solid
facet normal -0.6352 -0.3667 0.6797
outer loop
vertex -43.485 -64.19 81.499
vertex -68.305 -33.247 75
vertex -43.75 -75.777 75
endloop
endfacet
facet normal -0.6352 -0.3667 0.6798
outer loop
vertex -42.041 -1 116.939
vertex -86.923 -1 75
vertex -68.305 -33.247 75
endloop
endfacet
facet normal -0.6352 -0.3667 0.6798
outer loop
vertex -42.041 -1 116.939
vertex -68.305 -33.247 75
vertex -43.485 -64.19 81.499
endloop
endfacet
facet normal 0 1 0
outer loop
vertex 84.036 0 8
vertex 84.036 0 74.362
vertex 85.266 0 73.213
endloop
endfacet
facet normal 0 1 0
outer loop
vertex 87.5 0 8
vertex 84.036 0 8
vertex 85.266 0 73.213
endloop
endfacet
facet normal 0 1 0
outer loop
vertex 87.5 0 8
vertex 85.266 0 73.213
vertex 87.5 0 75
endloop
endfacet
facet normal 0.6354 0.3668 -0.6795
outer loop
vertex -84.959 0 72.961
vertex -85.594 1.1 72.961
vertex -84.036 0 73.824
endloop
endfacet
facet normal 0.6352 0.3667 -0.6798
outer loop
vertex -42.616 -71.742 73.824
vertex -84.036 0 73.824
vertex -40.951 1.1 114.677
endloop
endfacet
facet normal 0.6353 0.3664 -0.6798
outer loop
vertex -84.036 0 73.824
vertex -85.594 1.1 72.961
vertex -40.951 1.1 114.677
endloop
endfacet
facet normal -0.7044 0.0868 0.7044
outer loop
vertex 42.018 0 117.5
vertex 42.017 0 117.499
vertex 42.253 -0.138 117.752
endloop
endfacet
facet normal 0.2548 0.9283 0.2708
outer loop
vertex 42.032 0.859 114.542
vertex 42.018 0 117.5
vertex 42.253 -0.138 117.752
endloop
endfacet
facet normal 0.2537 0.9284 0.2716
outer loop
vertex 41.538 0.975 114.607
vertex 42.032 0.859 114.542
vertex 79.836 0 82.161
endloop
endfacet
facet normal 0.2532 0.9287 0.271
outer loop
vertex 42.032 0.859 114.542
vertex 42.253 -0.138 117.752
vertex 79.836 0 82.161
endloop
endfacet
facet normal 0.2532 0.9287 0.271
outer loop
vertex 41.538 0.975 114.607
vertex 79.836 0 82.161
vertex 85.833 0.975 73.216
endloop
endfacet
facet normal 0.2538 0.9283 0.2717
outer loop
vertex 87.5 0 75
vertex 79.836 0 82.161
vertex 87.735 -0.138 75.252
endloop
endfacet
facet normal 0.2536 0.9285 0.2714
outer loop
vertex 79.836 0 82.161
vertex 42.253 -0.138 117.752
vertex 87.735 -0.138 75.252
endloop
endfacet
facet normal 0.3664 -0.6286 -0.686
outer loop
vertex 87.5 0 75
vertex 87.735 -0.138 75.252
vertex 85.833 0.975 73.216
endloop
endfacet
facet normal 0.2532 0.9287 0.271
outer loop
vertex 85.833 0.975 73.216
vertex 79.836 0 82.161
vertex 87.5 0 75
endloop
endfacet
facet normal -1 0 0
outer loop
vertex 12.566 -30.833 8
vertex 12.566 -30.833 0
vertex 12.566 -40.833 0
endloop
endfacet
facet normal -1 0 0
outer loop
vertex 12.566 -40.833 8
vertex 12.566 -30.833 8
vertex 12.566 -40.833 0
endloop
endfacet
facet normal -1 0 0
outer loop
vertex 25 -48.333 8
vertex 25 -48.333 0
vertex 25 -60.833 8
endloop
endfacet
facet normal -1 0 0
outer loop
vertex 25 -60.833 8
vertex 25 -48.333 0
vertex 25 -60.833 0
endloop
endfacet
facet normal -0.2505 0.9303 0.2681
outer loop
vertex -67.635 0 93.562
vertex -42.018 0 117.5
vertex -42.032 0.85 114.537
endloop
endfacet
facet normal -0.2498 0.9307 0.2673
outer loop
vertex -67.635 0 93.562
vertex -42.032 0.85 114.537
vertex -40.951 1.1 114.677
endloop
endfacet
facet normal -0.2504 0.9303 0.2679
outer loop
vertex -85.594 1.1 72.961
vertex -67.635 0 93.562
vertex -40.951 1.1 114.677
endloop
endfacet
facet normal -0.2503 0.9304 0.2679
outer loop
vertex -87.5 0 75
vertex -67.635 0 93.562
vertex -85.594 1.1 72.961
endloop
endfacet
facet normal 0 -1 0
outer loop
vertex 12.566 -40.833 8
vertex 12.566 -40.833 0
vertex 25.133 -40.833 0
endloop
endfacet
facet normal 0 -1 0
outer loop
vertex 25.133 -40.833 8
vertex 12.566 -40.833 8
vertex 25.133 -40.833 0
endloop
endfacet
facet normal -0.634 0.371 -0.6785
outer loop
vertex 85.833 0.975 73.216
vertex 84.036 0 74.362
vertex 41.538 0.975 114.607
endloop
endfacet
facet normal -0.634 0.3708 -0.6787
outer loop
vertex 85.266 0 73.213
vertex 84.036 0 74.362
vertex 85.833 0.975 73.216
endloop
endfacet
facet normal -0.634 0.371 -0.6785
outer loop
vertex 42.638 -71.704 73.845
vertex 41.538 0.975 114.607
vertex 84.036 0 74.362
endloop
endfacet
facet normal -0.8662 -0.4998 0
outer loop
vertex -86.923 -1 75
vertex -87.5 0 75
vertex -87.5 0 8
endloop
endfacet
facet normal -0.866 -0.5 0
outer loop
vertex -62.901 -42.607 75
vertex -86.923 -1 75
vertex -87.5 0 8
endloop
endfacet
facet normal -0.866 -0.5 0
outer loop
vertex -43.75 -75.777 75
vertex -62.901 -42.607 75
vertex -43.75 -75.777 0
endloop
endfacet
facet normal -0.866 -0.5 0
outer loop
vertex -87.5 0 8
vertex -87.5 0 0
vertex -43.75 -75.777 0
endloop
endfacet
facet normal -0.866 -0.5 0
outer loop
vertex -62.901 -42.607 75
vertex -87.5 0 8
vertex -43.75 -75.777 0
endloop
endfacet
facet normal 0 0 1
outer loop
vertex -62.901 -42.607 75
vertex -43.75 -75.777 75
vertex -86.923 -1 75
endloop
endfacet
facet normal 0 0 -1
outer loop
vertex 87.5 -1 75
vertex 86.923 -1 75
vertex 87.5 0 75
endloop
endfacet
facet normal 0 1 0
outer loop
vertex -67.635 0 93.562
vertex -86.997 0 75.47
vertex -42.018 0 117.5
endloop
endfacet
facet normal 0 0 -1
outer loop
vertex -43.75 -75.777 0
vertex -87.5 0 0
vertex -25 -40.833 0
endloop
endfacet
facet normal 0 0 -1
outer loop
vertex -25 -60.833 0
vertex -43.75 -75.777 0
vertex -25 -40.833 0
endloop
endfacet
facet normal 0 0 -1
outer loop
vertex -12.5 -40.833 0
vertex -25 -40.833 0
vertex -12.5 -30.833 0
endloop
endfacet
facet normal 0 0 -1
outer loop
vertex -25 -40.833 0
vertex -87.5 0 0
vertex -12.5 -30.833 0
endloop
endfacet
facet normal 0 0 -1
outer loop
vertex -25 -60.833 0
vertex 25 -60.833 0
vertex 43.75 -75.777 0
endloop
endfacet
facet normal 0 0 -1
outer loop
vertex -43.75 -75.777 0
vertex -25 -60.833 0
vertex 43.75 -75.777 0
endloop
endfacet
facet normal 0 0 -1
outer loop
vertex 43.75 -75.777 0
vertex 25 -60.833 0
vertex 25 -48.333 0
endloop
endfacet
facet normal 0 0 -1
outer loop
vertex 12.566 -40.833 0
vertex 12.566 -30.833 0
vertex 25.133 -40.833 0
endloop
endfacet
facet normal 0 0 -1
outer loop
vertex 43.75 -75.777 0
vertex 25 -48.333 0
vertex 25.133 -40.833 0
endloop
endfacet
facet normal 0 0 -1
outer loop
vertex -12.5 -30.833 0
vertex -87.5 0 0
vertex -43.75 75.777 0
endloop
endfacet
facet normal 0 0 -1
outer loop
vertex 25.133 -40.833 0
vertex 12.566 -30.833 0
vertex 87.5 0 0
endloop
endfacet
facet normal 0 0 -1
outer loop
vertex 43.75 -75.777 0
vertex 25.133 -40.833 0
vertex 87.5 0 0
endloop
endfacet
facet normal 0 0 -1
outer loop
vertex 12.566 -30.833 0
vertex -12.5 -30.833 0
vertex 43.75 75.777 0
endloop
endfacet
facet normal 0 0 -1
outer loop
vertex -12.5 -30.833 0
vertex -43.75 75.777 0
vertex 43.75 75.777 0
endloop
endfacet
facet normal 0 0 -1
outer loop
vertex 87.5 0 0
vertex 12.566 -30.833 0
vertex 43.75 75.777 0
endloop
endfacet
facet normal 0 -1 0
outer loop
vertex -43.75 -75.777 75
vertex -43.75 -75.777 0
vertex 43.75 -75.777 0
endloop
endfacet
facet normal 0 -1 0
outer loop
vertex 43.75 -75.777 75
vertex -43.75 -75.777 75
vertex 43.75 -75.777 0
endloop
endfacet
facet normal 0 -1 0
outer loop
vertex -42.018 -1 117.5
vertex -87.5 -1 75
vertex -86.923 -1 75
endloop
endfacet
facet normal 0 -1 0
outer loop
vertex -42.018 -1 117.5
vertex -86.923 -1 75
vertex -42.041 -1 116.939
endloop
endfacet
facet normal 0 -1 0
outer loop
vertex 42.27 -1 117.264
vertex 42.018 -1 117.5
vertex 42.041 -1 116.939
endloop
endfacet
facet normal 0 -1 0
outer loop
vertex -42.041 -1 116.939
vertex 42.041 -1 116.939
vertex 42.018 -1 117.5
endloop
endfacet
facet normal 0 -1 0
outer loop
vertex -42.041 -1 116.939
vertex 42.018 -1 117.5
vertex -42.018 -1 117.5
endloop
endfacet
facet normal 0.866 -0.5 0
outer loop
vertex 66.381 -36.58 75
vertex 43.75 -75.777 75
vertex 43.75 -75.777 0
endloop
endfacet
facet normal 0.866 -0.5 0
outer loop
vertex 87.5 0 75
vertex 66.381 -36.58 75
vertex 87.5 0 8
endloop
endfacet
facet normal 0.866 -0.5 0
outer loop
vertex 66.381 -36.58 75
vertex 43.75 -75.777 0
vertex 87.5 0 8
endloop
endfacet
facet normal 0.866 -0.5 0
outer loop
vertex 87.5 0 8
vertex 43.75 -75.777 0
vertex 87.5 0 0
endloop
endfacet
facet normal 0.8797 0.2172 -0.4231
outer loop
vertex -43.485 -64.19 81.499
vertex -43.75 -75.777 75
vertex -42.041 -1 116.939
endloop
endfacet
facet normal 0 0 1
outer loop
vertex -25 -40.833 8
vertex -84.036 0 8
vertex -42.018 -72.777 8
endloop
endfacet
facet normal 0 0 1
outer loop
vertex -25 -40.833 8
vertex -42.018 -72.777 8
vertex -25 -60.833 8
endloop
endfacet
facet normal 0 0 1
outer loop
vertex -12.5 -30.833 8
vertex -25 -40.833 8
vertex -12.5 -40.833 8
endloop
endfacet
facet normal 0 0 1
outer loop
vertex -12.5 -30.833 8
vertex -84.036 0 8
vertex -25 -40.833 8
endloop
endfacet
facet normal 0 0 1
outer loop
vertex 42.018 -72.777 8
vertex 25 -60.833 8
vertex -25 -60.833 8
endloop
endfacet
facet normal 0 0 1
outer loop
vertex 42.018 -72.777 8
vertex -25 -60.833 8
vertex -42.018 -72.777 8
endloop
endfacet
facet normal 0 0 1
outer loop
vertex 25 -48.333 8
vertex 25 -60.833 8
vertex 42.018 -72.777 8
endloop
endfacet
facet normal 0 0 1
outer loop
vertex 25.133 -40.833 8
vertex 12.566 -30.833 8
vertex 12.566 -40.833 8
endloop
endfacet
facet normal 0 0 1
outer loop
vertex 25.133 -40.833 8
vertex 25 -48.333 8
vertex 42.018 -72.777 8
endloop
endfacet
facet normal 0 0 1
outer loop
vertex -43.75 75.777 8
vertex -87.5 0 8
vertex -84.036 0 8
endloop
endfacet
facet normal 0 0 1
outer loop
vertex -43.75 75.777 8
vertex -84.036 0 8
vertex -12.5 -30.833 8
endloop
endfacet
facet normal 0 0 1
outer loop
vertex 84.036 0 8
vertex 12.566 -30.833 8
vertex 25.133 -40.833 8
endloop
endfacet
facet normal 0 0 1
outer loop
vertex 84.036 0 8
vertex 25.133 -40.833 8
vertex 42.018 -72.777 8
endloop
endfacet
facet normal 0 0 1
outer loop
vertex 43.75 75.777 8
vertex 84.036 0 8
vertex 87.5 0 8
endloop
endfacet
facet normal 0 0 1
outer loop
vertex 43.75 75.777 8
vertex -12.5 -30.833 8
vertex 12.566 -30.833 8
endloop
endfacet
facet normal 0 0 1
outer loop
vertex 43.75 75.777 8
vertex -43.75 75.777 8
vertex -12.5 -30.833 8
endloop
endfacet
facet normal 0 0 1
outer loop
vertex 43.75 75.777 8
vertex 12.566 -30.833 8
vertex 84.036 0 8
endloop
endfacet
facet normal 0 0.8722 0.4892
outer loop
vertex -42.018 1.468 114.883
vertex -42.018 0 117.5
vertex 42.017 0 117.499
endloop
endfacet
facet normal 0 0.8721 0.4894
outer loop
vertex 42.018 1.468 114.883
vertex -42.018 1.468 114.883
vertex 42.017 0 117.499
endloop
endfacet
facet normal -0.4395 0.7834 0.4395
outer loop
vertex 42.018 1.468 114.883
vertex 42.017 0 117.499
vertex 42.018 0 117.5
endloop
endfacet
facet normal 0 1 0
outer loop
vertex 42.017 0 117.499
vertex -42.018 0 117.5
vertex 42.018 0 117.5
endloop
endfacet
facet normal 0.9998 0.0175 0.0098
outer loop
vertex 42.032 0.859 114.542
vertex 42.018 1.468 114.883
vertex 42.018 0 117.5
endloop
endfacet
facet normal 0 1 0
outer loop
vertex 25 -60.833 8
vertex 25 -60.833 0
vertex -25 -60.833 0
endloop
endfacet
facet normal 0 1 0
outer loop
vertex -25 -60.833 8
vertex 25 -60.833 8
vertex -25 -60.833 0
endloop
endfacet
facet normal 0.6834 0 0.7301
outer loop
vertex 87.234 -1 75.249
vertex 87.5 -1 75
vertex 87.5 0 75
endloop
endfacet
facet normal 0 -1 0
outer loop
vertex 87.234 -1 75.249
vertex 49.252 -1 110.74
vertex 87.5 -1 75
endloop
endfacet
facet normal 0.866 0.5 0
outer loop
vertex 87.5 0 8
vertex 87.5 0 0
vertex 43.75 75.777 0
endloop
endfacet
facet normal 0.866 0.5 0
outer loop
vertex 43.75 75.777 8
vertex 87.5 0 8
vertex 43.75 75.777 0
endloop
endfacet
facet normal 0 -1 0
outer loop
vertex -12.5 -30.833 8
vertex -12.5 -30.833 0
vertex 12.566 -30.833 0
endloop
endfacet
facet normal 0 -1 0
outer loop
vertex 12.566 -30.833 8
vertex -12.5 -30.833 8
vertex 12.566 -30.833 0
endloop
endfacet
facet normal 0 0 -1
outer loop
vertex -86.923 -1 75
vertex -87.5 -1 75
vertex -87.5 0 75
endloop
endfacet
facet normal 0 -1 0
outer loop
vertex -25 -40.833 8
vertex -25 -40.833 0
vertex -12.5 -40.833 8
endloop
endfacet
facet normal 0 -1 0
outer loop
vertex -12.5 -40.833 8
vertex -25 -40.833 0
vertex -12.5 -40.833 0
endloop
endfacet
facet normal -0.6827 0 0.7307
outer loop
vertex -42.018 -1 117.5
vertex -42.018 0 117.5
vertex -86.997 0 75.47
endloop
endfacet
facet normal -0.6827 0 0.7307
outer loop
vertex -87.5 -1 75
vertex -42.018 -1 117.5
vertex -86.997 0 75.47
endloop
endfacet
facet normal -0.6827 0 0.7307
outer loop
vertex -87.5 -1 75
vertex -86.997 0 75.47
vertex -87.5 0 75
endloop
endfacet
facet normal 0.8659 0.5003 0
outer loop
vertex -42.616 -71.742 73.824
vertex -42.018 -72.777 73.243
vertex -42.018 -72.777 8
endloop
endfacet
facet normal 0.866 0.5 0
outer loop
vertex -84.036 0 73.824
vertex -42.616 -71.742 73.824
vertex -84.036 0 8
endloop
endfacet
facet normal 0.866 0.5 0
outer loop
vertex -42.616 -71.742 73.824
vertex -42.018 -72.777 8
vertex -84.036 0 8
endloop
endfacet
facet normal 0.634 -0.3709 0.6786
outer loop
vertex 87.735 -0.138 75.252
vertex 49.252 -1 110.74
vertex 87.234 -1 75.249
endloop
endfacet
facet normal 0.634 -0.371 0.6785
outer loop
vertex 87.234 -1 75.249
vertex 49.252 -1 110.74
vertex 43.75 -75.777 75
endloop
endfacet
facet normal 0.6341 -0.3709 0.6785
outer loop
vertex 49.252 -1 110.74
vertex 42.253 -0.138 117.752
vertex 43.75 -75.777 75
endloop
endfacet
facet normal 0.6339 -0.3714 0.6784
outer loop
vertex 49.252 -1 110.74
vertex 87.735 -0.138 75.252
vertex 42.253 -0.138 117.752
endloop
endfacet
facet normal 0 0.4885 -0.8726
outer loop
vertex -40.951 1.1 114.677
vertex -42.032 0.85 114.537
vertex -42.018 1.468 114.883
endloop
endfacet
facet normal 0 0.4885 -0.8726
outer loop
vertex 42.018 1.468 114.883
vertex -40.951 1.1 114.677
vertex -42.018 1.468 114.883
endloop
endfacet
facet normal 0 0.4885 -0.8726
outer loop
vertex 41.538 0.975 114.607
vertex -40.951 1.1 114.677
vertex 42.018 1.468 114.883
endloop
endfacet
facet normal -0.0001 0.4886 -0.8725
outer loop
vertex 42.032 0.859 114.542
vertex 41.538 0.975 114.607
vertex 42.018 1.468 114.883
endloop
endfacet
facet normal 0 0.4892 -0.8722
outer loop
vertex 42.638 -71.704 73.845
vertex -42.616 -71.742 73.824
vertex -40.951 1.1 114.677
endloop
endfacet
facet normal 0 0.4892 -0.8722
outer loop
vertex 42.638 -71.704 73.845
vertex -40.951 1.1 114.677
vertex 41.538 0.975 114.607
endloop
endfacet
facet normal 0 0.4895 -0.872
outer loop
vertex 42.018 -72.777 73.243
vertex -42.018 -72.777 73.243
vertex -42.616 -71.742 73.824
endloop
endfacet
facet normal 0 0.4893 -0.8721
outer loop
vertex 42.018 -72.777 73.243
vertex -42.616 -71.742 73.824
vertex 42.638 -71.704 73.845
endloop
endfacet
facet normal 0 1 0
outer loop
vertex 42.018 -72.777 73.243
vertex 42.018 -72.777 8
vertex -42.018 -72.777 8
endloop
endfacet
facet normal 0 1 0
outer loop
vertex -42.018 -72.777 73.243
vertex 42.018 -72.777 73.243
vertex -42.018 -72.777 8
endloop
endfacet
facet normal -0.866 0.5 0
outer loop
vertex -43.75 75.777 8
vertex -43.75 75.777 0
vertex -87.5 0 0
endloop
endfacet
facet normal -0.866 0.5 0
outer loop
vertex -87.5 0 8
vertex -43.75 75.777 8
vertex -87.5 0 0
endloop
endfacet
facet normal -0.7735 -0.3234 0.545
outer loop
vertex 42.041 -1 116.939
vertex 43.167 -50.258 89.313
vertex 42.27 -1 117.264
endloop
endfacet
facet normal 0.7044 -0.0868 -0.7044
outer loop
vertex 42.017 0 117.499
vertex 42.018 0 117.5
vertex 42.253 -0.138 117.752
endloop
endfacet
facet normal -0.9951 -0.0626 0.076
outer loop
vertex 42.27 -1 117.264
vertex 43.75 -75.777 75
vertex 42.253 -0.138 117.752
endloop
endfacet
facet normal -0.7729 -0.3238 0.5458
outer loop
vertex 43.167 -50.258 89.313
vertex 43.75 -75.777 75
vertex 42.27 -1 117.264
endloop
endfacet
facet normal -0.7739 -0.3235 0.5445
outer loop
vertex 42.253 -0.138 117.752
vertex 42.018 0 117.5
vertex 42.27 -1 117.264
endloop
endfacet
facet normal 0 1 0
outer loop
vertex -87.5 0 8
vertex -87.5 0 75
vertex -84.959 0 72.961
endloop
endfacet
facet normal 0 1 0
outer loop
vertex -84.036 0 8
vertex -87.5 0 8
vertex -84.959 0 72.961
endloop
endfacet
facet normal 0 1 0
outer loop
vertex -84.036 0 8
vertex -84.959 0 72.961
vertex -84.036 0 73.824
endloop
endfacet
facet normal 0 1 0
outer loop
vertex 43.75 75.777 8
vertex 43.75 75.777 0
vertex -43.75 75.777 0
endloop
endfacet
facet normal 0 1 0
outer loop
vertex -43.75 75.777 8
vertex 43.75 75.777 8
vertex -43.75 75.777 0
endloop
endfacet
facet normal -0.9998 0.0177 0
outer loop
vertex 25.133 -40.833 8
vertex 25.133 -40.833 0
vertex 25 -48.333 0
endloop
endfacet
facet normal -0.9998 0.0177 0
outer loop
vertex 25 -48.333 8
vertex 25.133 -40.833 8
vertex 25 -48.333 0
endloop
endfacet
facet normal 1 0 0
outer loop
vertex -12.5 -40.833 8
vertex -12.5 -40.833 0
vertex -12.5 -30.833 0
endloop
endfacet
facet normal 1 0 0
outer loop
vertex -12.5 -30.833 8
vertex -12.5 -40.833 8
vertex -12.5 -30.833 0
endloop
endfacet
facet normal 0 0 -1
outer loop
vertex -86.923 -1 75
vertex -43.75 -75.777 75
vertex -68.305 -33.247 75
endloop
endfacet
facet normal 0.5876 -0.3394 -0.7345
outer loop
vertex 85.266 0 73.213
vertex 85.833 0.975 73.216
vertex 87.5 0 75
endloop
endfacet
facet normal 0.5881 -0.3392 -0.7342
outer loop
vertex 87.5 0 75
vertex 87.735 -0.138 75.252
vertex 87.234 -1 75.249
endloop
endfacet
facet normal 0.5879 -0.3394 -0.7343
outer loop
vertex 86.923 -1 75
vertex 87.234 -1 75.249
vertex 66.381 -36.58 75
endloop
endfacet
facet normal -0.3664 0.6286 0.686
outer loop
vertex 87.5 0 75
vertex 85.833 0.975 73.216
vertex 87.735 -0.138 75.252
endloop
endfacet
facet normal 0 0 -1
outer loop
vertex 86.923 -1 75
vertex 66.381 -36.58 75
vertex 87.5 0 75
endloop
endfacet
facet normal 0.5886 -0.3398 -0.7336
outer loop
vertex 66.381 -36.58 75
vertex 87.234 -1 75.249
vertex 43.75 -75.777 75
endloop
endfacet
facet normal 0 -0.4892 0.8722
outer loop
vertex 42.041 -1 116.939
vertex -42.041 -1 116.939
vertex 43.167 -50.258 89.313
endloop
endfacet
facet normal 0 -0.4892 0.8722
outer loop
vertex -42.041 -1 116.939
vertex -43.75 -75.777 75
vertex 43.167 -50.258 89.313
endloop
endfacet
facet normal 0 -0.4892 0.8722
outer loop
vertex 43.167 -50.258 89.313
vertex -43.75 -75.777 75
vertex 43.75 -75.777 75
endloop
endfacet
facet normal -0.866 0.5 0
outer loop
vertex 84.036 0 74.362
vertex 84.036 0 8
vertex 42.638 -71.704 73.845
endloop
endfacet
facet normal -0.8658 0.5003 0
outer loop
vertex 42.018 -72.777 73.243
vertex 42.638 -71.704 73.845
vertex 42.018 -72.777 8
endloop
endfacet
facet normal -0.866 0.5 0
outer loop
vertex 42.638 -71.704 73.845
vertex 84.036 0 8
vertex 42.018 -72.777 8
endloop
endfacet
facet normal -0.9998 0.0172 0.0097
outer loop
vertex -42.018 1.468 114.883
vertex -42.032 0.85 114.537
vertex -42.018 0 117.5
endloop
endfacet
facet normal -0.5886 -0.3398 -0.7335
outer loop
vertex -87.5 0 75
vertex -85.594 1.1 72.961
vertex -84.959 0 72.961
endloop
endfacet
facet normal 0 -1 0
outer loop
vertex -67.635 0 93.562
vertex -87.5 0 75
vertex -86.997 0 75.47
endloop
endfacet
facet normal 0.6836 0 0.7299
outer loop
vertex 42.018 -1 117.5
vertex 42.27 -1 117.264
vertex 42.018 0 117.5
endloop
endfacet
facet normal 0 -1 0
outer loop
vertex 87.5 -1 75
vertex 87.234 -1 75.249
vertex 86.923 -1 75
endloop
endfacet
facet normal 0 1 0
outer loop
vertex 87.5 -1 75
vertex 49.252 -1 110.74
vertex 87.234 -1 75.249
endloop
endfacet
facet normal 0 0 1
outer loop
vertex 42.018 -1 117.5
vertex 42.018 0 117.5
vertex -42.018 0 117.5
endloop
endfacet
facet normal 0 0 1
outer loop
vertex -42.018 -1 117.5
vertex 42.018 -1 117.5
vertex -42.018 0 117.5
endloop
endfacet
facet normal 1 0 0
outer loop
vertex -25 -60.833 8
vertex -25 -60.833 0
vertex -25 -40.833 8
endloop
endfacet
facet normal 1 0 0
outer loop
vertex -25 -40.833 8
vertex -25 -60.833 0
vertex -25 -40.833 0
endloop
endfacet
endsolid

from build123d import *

# Parameters (mm, degrees)
F0_W      = 50
F0_H      = 12.5
F1_DEPTH  = 8
F2_DEPTH  = 75
F4_DEPTH  = 8
F7_DEPTH  = 3
F8_DEPTH  = 1
F11_DEPTH = 3
F14_DEPTH = 3
F15_DEPTH = 8
F16_DEPTH = 25


with BuildPart() as f1:
    # F0 (on Top) → F1 (new body)
    with BuildSketch(Plane.XY):
        Polygon((-42.017949, 72.777223), (-84.035898, 0), (-42.017949, -72.777223), (42.017949, -72.777223), (84.035898, 0), (42.017949, 72.777223), align=None)
        Polygon((25.132911, -40.832917), (25, -48.332917), (25, -60.832917), (-25, -60.832917), (-25, -48.332917), (-25, -40.832917), (-12.5, -40.832917), (-12.5, -30.832917), (12.566456, -30.832917), (12.566456, -40.832917), align=None, mode=Mode.SUBTRACT)
        with Locations((0, 54.582917)):
            Rectangle(F0_W, F0_H, mode=Mode.SUBTRACT)
    extrude(amount=F1_DEPTH)

    # F0 (on Top) → F2 (join)
    with BuildSketch(Plane.XY):
        Polygon((-84.035898, 0), (-87.5, 0), (-43.75, -75.777223), (43.75, -75.777223), (87.5, 0), (84.035898, 0), (42.017949, -72.777223), (-42.017949, -72.777223), align=None)
    extrude(amount=F2_DEPTH)

    # F0 (on Top) → F4 (join)
    with BuildSketch(Plane.XY):
        Polygon((43.75, 75.777223), (-43.75, 75.777223), (-87.5, 0), (-84.035898, 0), (-42.017949, 72.777223), (42.017949, 72.777223), (84.035898, 0), (87.5, 0), align=None)
    extrude(amount=F4_DEPTH)

    # F6 (on face) → F7 (join)
    with BuildSketch(Plane(origin=(0, -50.131237, 89.383668), x_dir=(1, 0, 0), z_dir=(0, 0.489171, -0.872188))):
        Polygon((43.75, 29.404192), (0, 29.404192), (-43.75, 29.404192), (-42.01795, -57.477552), (42.01795, -57.477552), align=None)
    extrude(amount=F7_DEPTH)

    # F3 (on Front) → F8 (join)
    with BuildSketch(Plane.XZ):
        Polygon((-42.01795, 114.5), (0, 114.5), (42.01795, 114.5), (84.0359, 75), (87.5, 75), (42.01795, 117.5), (0, 117.5), (-42.01795, 117.5), (-87.5, 75), (-84.0359, 75), align=None)
    extrude(amount=F8_DEPTH)

    # F10 (on face) → F11 (join)
    with BuildSketch(Plane(origin=(-67.684673, -39.077764, 72.433827), x_dir=(0.772363, -0.301588, 0.559017), z_dir=(-0.635181, -0.366722, 0.67975))):
        Polygon((33.231426, 55.789645), (-25.65546, 35.610412), (30.988892, -31.080422), align=None)
    extrude(amount=-F11_DEPTH)

    # F13 (on face) → F14 (join)
    with BuildSketch(Plane(origin=(67.675669, -39.595085, 72.424192), x_dir=(0.773305, 0.304147, -0.556322), z_dir=(-0.634035, 0.370955, -0.678522))):
        Polygon((-30.93951, 30.511739), (-32.875165, -56.364915), (25.940007, -35.977606), align=None)
    extrude(amount=F14_DEPTH)

    # F0 (on Top) → F15 (join)
    with BuildSketch(Plane.XY):
        with Locations((0, 54.582917)):
            Rectangle(F0_W, F0_H)
    extrude(amount=F15_DEPTH)

    # F0 (on Top) → F16 (cut)
    with BuildSketch(Plane.XY):
        Polygon((25, -60.832917), (25, -48.332917), (25.132911, -40.832917), (12.566456, -40.832917), (0, -40.832917), (-12.5, -40.832917), (-25, -40.832917), (-25, -48.332917), (-25, -60.832917), align=None)
    extrude(amount=-F16_DEPTH, mode=Mode.SUBTRACT)


solid = f1.part
